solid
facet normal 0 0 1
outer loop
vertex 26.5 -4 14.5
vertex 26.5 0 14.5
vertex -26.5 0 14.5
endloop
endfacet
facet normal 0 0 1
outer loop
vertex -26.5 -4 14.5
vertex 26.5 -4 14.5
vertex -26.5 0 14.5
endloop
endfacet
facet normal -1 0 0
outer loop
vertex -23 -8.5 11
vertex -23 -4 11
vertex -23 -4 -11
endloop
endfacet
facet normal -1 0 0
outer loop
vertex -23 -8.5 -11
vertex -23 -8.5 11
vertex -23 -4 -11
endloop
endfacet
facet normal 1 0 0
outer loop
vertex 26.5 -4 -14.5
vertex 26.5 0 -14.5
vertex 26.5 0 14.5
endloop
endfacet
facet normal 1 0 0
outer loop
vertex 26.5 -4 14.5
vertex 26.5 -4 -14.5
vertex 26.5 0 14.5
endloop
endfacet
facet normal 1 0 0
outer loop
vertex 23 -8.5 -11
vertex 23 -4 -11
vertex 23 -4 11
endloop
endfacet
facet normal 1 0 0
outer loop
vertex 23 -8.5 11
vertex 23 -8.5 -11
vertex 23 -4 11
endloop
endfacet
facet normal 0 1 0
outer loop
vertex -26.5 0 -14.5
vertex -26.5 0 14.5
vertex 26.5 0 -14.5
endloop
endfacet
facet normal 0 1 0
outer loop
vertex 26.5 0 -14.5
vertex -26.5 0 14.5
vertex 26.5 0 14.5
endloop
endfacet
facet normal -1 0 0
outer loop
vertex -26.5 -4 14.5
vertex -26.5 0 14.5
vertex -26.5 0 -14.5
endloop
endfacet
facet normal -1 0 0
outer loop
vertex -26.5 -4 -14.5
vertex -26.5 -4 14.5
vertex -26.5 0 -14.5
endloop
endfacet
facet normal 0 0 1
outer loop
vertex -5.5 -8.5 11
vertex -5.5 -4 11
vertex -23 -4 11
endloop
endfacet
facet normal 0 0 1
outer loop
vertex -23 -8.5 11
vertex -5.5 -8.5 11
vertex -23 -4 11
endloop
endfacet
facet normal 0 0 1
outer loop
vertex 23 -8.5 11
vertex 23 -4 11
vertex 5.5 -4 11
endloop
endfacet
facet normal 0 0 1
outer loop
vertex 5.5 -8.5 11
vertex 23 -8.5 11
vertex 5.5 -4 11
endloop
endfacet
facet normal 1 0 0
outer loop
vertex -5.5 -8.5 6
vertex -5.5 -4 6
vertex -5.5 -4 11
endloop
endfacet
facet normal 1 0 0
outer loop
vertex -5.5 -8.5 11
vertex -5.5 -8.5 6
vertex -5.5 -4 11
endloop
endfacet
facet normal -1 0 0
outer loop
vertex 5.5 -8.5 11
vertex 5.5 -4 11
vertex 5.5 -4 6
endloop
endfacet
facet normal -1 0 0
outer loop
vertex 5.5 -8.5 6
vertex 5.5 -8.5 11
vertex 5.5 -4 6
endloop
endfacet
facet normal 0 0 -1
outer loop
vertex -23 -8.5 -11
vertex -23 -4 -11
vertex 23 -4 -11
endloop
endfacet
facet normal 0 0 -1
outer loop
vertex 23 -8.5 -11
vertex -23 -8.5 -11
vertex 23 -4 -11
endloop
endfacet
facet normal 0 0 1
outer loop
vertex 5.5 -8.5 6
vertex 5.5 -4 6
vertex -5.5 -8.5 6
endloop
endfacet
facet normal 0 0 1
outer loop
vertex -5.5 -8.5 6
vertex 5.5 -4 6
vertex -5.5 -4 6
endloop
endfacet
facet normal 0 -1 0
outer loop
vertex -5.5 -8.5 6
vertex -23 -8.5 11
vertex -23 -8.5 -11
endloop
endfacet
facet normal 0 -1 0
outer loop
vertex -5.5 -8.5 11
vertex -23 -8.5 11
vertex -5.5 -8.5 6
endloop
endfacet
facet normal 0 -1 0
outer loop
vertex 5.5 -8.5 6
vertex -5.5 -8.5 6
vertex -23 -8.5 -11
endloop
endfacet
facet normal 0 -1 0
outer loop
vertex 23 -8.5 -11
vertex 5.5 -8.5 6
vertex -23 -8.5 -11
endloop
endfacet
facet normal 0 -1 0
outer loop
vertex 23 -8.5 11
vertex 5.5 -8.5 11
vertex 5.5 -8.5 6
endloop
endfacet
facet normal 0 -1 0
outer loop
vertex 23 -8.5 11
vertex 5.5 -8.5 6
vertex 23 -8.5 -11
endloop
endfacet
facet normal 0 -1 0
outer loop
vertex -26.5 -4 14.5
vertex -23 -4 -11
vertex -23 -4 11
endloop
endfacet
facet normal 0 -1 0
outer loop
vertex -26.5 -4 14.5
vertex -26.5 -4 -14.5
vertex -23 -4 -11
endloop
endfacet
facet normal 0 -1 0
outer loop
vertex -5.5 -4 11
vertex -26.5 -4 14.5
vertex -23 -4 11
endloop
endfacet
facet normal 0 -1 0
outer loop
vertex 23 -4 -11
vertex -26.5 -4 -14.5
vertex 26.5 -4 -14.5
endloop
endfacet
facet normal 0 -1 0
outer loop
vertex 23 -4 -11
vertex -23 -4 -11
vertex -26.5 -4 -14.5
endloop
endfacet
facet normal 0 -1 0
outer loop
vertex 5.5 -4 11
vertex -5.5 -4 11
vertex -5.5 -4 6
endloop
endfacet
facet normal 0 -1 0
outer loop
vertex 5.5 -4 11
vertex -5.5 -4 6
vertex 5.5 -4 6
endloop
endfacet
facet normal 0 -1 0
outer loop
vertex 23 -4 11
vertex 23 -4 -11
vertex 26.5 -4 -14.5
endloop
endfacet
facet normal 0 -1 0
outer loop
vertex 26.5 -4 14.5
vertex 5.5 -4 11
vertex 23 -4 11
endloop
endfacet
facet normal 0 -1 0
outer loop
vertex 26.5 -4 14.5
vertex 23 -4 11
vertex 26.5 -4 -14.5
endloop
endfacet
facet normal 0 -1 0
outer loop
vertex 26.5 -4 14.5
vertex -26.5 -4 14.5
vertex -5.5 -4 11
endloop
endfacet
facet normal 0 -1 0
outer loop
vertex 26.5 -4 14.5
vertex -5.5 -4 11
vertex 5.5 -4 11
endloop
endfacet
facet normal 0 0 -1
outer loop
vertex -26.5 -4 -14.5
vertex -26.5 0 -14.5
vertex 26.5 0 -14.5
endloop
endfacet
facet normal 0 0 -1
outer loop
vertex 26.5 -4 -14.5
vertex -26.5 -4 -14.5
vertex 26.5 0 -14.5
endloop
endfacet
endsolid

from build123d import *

# Parameters (mm, degrees)
F0_W     = 5.5
F0_H     = 3.5
F1_DEPTH = 4
F2_DEPTH = 8.5
F3_DEPTH = 1


with BuildPart() as f1:
    # F0 (on Front) → F1 (new body)
    with BuildSketch(Plane.XZ):
        Polygon((-5.5, 14.5), (-26.5, 14.5), (-26.5, -14.5), (26.5, -14.5), (26.5, 14.5), (5.5, 14.5), (5.5, 11), (23, 11), (23, -11), (-23, -11), (-23, 11), (-5.5, 11), align=None)
        with Locations((-2.75, 12.75)):
            Rectangle(F0_W, F0_H)
        with Locations((2.75, 12.75)):
            Rectangle(F0_W, F0_H)
        Polygon((0, 11), (-5.5, 11), (-5.5, 6), (5.5, 6), (5.5, 11), align=None)
    extrude(amount=F1_DEPTH)

    # F0 (on Front) → F2 (join)
    with BuildSketch(Plane.XZ):
        Polygon((-5.5, 6), (-5.5, 11), (-23, 11), (-23, -11), (23, -11), (23, 11), (5.5, 11), (5.5, 6), align=None)
    extrude(amount=F2_DEPTH)

    # F0 (on Front) → F3 (join)
    with BuildSketch(Plane.XZ):
        with Locations((-2.75, 12.75)):
            Rectangle(F0_W, F0_H)
        with Locations((2.75, 12.75)):
            Rectangle(F0_W, F0_H)
        Polygon((0, 11), (-5.5, 11), (-5.5, 6), (5.5, 6), (5.5, 11), align=None)
    extrude(amount=F3_DEPTH)


solid = f1.part
